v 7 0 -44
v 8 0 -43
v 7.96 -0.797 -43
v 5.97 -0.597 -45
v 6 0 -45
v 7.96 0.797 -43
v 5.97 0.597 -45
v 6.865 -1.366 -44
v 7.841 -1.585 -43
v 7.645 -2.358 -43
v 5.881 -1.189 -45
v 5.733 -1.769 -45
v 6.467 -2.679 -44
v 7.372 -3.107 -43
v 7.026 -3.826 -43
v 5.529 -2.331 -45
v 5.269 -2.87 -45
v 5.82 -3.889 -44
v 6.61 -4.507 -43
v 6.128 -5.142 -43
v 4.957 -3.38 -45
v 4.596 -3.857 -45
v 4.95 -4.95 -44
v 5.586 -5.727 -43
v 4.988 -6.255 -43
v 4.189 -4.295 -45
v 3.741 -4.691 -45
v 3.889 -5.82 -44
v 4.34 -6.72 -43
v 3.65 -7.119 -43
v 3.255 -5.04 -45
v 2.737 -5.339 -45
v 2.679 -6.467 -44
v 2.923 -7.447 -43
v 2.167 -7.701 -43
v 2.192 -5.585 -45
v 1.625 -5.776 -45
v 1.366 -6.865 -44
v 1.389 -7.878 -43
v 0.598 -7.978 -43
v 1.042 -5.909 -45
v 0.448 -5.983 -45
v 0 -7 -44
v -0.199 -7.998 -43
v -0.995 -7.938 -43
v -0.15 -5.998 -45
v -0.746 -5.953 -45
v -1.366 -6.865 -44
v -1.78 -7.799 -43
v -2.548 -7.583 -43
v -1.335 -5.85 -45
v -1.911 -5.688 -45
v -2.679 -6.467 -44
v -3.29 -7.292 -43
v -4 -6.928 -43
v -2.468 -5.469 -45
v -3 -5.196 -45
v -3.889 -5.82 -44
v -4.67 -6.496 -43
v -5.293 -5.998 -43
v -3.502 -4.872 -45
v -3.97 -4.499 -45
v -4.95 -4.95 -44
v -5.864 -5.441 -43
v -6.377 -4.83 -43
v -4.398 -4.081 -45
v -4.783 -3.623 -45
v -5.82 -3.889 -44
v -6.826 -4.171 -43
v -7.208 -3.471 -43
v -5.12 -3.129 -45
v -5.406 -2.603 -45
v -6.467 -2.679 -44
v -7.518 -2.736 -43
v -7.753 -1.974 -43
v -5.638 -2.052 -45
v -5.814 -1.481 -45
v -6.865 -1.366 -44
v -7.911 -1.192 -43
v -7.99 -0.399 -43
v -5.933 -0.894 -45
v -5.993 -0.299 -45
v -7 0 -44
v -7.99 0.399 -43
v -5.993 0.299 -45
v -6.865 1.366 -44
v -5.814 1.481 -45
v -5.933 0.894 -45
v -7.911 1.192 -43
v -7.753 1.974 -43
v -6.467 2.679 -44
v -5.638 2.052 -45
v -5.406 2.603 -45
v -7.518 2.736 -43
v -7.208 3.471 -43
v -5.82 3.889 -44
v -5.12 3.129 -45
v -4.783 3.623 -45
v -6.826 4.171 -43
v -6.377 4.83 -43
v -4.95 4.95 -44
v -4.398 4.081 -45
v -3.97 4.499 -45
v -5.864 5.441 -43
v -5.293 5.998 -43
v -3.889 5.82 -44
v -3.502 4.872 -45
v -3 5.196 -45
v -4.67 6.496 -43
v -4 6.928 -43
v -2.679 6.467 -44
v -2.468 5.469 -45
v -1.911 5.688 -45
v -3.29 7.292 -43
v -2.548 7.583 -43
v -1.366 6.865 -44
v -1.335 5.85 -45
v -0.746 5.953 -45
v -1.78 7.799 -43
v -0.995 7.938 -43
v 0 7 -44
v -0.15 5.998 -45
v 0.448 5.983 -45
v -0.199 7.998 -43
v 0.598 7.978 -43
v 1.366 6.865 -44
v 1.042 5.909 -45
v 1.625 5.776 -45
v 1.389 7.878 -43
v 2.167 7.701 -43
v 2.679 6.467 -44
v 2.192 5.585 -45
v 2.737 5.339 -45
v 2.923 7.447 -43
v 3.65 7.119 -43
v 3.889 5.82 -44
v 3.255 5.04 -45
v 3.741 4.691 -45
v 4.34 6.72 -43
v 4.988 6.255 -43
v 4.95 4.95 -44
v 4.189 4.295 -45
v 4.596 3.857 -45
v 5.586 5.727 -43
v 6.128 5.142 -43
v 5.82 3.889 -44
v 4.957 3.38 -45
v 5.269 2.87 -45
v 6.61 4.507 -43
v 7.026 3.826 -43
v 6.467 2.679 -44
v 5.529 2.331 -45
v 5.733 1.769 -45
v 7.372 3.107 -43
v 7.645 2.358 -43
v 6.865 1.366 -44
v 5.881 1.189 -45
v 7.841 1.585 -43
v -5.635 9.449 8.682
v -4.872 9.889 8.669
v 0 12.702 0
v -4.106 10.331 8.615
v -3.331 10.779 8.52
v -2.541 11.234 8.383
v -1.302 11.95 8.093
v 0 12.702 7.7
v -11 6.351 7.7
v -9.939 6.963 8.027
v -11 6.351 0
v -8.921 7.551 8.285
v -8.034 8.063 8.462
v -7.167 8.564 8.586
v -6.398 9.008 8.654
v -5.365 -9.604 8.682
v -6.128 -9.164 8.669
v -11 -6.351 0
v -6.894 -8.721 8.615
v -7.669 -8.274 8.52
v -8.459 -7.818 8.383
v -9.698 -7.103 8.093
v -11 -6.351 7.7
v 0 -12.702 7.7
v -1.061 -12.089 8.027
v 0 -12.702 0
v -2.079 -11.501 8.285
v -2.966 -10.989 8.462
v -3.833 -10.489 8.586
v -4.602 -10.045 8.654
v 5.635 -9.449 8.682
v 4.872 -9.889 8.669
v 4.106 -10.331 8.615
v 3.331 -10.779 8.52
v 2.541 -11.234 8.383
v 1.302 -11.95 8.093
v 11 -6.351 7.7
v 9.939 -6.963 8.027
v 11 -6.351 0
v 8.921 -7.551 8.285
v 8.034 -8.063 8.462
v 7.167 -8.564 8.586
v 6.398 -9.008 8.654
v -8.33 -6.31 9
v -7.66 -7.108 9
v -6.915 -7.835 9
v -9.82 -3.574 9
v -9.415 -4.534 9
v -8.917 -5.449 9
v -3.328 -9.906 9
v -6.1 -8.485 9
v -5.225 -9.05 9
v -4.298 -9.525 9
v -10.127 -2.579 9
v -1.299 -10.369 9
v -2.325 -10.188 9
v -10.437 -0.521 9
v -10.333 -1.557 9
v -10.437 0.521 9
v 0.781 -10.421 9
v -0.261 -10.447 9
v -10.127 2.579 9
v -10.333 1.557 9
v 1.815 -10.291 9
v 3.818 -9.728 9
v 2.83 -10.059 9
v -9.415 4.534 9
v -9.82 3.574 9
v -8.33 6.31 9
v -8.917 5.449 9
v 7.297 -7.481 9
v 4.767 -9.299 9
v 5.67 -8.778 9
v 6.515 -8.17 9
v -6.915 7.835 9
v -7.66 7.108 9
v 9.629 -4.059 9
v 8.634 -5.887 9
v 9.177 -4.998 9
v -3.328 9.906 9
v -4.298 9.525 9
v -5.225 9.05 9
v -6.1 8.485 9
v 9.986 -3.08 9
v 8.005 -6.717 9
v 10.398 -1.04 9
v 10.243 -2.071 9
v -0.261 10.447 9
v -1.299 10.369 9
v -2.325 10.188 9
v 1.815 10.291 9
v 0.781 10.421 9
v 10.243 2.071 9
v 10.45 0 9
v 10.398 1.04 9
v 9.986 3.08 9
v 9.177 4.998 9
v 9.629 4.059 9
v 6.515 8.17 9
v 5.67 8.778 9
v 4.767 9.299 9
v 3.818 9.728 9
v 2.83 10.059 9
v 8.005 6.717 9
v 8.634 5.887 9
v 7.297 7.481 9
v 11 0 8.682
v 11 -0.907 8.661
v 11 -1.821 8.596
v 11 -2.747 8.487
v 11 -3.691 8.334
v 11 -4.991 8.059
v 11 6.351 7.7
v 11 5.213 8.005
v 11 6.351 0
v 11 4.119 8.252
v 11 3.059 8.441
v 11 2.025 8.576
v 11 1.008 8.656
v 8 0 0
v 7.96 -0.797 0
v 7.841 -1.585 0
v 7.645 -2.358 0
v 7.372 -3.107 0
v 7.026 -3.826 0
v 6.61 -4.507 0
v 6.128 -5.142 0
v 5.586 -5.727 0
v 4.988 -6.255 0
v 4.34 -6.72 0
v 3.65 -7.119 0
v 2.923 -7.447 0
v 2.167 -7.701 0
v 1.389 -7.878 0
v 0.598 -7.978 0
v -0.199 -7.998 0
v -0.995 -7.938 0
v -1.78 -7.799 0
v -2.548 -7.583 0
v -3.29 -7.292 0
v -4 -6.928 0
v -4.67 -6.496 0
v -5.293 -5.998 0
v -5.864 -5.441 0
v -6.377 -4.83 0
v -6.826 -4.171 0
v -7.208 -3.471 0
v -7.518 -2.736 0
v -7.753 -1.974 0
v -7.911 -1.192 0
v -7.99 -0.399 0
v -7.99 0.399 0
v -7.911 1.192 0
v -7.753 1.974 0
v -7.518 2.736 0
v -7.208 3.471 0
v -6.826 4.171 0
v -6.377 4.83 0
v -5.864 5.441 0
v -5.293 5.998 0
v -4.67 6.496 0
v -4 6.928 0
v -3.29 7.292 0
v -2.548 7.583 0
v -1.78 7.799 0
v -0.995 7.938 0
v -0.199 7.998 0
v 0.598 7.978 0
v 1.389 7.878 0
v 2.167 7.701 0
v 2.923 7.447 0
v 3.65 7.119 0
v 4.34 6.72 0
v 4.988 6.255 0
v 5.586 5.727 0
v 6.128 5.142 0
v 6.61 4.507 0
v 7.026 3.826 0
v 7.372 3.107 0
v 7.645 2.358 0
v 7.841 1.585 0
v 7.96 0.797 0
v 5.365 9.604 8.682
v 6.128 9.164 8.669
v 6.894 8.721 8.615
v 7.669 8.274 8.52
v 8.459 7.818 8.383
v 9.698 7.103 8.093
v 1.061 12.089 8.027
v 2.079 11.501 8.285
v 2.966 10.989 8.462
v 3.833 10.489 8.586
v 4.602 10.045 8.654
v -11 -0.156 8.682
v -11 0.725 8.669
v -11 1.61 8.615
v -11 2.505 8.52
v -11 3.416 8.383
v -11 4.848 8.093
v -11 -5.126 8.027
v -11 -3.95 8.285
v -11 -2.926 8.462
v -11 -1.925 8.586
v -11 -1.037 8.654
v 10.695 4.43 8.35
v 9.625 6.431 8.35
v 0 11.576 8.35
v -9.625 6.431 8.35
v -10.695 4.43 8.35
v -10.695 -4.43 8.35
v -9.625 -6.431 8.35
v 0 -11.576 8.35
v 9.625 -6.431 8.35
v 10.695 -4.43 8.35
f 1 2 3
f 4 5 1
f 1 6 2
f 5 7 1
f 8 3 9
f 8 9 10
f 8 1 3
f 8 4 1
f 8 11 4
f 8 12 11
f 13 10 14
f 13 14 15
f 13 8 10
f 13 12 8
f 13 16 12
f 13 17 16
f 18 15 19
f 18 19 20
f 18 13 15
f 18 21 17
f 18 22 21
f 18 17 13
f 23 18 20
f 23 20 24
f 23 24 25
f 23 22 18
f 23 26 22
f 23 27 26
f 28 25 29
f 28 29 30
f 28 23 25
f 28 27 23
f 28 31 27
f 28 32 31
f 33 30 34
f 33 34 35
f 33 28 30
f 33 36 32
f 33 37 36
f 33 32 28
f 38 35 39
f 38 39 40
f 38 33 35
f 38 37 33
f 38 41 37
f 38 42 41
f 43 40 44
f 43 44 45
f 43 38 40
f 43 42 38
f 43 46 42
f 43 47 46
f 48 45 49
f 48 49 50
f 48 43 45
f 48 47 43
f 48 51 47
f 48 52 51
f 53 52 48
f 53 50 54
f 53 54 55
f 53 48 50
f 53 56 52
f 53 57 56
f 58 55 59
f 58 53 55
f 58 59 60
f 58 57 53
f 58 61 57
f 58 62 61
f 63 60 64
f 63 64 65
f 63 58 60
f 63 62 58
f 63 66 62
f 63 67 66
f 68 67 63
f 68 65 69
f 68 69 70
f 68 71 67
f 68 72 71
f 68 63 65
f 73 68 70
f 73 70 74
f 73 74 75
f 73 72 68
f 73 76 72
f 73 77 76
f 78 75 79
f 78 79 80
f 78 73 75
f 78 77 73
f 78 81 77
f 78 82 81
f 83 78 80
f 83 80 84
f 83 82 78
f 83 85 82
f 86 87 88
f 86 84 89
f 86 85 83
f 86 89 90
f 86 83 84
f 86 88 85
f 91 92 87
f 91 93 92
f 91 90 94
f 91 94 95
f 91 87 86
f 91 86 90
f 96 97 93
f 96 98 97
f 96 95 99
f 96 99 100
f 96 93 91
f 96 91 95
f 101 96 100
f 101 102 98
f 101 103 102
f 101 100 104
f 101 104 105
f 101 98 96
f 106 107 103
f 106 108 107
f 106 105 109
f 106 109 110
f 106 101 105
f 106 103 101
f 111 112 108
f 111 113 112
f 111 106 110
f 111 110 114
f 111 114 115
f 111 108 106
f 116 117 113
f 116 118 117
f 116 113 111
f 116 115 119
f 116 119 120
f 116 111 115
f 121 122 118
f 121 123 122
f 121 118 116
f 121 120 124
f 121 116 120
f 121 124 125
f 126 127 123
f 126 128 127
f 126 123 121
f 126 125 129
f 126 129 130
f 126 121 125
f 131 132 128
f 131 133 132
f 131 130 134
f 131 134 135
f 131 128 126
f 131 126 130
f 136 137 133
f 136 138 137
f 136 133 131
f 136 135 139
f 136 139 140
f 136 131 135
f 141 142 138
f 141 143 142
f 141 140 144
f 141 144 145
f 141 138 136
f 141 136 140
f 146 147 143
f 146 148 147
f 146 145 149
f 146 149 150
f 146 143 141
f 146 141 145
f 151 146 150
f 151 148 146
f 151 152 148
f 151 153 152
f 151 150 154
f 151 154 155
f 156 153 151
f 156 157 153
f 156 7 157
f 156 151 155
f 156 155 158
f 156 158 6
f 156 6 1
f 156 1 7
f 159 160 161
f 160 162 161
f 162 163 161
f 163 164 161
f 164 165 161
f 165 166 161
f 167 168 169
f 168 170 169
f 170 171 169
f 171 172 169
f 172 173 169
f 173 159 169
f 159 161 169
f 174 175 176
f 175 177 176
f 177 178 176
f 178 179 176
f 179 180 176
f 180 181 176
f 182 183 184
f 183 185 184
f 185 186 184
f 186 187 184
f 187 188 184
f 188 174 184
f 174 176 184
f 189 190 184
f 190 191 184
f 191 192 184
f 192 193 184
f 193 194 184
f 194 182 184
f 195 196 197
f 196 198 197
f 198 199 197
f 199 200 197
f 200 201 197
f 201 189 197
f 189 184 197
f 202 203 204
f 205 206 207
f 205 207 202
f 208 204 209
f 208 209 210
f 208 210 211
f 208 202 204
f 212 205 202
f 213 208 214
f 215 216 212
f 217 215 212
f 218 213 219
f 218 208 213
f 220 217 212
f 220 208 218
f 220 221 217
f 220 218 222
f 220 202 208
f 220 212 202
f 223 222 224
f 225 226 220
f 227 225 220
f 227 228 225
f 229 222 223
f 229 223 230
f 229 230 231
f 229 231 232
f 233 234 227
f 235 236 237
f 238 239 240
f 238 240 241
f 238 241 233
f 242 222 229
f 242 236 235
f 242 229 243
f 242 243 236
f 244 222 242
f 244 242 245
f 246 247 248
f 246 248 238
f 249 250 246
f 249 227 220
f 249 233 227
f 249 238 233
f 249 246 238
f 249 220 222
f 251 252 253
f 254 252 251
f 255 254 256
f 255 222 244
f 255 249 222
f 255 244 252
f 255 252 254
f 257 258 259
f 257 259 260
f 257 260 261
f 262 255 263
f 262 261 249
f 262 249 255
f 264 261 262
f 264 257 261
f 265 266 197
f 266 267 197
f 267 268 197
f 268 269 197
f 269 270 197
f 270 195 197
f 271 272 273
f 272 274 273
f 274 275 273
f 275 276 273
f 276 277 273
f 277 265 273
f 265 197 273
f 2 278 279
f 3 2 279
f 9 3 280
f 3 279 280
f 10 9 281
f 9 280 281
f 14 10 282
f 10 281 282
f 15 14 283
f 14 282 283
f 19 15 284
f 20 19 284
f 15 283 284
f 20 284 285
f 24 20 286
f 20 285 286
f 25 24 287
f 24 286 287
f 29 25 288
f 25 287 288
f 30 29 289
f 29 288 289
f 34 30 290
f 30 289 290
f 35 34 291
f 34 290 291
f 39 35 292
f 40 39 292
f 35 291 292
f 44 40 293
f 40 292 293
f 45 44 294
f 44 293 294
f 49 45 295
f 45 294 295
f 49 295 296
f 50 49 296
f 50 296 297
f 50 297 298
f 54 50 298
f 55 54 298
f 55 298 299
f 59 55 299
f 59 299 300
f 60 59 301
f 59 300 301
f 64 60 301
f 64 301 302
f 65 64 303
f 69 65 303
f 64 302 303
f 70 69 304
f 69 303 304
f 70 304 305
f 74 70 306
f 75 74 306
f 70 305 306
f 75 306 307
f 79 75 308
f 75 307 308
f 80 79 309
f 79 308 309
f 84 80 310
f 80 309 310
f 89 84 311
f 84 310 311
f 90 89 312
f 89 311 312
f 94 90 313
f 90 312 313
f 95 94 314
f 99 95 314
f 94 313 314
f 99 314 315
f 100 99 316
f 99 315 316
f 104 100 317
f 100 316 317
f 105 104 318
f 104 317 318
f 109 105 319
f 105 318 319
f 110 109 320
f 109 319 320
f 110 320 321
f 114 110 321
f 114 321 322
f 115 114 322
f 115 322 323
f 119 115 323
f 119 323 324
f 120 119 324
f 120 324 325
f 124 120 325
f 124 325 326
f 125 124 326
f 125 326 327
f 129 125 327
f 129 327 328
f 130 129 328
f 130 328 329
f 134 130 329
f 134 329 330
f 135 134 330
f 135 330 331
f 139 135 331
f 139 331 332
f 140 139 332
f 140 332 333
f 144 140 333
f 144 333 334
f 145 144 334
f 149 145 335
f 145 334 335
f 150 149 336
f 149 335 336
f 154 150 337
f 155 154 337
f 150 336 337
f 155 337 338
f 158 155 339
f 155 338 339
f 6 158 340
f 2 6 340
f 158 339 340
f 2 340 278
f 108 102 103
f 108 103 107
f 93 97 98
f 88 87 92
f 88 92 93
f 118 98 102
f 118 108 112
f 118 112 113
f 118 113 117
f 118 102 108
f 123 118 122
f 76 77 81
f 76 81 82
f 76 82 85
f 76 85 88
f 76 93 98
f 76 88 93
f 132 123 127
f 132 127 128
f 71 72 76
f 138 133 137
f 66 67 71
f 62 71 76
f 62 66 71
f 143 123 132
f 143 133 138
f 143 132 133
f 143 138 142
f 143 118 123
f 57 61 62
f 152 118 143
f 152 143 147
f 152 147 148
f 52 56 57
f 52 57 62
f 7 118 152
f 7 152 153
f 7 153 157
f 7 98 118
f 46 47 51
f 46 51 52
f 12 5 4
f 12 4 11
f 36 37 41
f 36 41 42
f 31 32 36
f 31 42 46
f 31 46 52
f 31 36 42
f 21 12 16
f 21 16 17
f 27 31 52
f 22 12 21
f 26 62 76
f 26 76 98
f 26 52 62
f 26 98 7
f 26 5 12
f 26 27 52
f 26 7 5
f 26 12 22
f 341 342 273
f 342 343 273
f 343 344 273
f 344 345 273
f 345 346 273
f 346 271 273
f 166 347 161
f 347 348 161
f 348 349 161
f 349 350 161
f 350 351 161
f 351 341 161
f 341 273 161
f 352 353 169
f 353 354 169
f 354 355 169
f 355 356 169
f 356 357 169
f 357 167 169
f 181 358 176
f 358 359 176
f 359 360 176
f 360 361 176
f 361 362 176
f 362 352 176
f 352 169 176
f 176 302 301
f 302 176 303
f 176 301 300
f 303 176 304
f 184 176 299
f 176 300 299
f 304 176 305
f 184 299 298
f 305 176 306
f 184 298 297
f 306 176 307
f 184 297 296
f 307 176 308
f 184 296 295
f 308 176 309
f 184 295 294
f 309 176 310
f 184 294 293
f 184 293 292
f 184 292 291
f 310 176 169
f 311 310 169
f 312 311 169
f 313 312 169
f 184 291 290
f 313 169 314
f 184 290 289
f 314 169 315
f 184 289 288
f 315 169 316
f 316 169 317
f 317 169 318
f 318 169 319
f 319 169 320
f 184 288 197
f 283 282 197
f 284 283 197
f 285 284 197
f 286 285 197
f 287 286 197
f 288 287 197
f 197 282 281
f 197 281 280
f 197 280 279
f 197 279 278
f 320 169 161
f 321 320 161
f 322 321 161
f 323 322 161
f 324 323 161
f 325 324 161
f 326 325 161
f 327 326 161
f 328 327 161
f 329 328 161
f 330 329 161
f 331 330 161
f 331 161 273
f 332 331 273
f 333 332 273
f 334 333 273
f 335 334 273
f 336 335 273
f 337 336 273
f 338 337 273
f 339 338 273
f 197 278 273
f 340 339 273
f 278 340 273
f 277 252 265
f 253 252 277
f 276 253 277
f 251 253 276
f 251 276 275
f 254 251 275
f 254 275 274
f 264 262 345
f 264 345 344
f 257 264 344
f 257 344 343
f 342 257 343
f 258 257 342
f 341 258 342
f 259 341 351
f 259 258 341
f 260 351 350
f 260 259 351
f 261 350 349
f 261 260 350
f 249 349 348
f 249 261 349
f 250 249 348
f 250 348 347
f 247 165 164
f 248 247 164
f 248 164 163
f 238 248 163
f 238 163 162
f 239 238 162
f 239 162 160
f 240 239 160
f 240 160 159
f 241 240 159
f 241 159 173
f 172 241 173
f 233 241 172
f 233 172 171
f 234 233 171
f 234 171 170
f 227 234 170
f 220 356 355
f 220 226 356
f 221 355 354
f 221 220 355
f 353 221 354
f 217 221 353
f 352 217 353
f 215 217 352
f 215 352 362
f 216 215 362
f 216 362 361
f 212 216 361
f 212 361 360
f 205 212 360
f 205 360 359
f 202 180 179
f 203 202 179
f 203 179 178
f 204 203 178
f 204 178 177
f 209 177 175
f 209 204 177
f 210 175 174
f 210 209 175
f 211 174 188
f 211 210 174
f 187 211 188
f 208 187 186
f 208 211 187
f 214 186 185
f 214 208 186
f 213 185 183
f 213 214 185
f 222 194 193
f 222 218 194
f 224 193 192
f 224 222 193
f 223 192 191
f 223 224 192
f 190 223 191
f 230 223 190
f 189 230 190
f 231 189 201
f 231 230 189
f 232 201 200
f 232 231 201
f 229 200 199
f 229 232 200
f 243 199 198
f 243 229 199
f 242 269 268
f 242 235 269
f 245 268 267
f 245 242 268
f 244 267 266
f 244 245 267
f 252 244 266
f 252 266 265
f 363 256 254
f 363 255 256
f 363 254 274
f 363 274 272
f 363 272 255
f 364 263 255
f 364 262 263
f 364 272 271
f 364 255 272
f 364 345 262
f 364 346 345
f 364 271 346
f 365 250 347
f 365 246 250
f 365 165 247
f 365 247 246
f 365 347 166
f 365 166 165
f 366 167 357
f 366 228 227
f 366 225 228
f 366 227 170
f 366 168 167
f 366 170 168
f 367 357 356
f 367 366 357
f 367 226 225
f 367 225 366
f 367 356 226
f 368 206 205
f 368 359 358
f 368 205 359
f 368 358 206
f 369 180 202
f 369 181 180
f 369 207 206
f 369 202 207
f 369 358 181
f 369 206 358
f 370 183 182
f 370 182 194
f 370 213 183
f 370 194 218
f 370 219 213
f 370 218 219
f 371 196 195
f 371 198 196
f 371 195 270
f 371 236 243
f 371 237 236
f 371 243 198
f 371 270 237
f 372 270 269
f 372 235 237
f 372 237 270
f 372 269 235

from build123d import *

# Parameters (mm, degrees)
EXTRUDE_337_DEPTH     = 9
SKETCH_D_OUTSIDE_W    = 65.598
SKETCH_D_OUTSIDE_H    = 69.002
SKETCH_D_OUTSIDE_R    = 10.45
CUT_EXTRUDE_379_DEPTH = 10
CUT_EXTRUDE_379_DRAFT = -60
SKETCH_398_R          = 8
EXTRUDE_460_DEPTH     = 45
CHAMFER_475_SIZE      = 2


with BuildPart() as part:
    # Sketch 332 → Extrude 337 (new body)
    with BuildSketch(Plane.XY):
        Polygon((0, -12.701705922), (11, -6.350852961), (11, 6.350852961), (0, 12.701705922), (-11, 6.350852961), (-11, -6.350852961), align=None)
    extrude(amount=EXTRUDE_337_DEPTH)


with BuildPart() as cut_extrude_379_tool:
    # D outside → Cut-Extrude 379 (with draft: the straight prism first)
    with BuildSketch(Plane.XY.offset(9)):
        Rectangle(SKETCH_D_OUTSIDE_W, SKETCH_D_OUTSIDE_H)
        Circle(SKETCH_D_OUTSIDE_R, mode=Mode.SUBTRACT)
    extrude(amount=-CUT_EXTRUDE_379_DEPTH)
    # Cut-Extrude 379: the draft: its side faces are tilted about the plane it starts from
    cut_extrude_379_sides = [cut_extrude_379_tool.faces().sort_by_distance(p)[0] for p in [
        (0, -34.501, 4),
        (32.799, 0, 4),
        (0, 34.501, 4),
        (-32.799, 0, 4),
        (-10.45, 0, 4),
    ]]
    draft(cut_extrude_379_sides, Plane.XY.offset(9), CUT_EXTRUDE_379_DRAFT)


with BuildPart() as part_1:
    add(part.part)

    # Cut-Extrude 379: cut by cut_extrude_379_tool
    add(cut_extrude_379_tool.part, mode=Mode.SUBTRACT)

    # Sketch 398 → Extrude 460 (add)
    with BuildSketch(Plane(origin=(0, 0, 0), x_dir=(-1, 0, 0), z_dir=(0, 0, -1))):
        with Locations(Location((0, 0, 0), (0, 0, 180))):
            Circle(SKETCH_398_R)
    extrude(amount=EXTRUDE_460_DEPTH)

    # Chamfer 475
    chamfer_475_edges = [part_1.edges().sort_by_distance(p)[0] for p in [
        (-8, 0, -45),
    ]]
    chamfer(chamfer_475_edges, length=CHAMFER_475_SIZE)


solid = part_1.part
